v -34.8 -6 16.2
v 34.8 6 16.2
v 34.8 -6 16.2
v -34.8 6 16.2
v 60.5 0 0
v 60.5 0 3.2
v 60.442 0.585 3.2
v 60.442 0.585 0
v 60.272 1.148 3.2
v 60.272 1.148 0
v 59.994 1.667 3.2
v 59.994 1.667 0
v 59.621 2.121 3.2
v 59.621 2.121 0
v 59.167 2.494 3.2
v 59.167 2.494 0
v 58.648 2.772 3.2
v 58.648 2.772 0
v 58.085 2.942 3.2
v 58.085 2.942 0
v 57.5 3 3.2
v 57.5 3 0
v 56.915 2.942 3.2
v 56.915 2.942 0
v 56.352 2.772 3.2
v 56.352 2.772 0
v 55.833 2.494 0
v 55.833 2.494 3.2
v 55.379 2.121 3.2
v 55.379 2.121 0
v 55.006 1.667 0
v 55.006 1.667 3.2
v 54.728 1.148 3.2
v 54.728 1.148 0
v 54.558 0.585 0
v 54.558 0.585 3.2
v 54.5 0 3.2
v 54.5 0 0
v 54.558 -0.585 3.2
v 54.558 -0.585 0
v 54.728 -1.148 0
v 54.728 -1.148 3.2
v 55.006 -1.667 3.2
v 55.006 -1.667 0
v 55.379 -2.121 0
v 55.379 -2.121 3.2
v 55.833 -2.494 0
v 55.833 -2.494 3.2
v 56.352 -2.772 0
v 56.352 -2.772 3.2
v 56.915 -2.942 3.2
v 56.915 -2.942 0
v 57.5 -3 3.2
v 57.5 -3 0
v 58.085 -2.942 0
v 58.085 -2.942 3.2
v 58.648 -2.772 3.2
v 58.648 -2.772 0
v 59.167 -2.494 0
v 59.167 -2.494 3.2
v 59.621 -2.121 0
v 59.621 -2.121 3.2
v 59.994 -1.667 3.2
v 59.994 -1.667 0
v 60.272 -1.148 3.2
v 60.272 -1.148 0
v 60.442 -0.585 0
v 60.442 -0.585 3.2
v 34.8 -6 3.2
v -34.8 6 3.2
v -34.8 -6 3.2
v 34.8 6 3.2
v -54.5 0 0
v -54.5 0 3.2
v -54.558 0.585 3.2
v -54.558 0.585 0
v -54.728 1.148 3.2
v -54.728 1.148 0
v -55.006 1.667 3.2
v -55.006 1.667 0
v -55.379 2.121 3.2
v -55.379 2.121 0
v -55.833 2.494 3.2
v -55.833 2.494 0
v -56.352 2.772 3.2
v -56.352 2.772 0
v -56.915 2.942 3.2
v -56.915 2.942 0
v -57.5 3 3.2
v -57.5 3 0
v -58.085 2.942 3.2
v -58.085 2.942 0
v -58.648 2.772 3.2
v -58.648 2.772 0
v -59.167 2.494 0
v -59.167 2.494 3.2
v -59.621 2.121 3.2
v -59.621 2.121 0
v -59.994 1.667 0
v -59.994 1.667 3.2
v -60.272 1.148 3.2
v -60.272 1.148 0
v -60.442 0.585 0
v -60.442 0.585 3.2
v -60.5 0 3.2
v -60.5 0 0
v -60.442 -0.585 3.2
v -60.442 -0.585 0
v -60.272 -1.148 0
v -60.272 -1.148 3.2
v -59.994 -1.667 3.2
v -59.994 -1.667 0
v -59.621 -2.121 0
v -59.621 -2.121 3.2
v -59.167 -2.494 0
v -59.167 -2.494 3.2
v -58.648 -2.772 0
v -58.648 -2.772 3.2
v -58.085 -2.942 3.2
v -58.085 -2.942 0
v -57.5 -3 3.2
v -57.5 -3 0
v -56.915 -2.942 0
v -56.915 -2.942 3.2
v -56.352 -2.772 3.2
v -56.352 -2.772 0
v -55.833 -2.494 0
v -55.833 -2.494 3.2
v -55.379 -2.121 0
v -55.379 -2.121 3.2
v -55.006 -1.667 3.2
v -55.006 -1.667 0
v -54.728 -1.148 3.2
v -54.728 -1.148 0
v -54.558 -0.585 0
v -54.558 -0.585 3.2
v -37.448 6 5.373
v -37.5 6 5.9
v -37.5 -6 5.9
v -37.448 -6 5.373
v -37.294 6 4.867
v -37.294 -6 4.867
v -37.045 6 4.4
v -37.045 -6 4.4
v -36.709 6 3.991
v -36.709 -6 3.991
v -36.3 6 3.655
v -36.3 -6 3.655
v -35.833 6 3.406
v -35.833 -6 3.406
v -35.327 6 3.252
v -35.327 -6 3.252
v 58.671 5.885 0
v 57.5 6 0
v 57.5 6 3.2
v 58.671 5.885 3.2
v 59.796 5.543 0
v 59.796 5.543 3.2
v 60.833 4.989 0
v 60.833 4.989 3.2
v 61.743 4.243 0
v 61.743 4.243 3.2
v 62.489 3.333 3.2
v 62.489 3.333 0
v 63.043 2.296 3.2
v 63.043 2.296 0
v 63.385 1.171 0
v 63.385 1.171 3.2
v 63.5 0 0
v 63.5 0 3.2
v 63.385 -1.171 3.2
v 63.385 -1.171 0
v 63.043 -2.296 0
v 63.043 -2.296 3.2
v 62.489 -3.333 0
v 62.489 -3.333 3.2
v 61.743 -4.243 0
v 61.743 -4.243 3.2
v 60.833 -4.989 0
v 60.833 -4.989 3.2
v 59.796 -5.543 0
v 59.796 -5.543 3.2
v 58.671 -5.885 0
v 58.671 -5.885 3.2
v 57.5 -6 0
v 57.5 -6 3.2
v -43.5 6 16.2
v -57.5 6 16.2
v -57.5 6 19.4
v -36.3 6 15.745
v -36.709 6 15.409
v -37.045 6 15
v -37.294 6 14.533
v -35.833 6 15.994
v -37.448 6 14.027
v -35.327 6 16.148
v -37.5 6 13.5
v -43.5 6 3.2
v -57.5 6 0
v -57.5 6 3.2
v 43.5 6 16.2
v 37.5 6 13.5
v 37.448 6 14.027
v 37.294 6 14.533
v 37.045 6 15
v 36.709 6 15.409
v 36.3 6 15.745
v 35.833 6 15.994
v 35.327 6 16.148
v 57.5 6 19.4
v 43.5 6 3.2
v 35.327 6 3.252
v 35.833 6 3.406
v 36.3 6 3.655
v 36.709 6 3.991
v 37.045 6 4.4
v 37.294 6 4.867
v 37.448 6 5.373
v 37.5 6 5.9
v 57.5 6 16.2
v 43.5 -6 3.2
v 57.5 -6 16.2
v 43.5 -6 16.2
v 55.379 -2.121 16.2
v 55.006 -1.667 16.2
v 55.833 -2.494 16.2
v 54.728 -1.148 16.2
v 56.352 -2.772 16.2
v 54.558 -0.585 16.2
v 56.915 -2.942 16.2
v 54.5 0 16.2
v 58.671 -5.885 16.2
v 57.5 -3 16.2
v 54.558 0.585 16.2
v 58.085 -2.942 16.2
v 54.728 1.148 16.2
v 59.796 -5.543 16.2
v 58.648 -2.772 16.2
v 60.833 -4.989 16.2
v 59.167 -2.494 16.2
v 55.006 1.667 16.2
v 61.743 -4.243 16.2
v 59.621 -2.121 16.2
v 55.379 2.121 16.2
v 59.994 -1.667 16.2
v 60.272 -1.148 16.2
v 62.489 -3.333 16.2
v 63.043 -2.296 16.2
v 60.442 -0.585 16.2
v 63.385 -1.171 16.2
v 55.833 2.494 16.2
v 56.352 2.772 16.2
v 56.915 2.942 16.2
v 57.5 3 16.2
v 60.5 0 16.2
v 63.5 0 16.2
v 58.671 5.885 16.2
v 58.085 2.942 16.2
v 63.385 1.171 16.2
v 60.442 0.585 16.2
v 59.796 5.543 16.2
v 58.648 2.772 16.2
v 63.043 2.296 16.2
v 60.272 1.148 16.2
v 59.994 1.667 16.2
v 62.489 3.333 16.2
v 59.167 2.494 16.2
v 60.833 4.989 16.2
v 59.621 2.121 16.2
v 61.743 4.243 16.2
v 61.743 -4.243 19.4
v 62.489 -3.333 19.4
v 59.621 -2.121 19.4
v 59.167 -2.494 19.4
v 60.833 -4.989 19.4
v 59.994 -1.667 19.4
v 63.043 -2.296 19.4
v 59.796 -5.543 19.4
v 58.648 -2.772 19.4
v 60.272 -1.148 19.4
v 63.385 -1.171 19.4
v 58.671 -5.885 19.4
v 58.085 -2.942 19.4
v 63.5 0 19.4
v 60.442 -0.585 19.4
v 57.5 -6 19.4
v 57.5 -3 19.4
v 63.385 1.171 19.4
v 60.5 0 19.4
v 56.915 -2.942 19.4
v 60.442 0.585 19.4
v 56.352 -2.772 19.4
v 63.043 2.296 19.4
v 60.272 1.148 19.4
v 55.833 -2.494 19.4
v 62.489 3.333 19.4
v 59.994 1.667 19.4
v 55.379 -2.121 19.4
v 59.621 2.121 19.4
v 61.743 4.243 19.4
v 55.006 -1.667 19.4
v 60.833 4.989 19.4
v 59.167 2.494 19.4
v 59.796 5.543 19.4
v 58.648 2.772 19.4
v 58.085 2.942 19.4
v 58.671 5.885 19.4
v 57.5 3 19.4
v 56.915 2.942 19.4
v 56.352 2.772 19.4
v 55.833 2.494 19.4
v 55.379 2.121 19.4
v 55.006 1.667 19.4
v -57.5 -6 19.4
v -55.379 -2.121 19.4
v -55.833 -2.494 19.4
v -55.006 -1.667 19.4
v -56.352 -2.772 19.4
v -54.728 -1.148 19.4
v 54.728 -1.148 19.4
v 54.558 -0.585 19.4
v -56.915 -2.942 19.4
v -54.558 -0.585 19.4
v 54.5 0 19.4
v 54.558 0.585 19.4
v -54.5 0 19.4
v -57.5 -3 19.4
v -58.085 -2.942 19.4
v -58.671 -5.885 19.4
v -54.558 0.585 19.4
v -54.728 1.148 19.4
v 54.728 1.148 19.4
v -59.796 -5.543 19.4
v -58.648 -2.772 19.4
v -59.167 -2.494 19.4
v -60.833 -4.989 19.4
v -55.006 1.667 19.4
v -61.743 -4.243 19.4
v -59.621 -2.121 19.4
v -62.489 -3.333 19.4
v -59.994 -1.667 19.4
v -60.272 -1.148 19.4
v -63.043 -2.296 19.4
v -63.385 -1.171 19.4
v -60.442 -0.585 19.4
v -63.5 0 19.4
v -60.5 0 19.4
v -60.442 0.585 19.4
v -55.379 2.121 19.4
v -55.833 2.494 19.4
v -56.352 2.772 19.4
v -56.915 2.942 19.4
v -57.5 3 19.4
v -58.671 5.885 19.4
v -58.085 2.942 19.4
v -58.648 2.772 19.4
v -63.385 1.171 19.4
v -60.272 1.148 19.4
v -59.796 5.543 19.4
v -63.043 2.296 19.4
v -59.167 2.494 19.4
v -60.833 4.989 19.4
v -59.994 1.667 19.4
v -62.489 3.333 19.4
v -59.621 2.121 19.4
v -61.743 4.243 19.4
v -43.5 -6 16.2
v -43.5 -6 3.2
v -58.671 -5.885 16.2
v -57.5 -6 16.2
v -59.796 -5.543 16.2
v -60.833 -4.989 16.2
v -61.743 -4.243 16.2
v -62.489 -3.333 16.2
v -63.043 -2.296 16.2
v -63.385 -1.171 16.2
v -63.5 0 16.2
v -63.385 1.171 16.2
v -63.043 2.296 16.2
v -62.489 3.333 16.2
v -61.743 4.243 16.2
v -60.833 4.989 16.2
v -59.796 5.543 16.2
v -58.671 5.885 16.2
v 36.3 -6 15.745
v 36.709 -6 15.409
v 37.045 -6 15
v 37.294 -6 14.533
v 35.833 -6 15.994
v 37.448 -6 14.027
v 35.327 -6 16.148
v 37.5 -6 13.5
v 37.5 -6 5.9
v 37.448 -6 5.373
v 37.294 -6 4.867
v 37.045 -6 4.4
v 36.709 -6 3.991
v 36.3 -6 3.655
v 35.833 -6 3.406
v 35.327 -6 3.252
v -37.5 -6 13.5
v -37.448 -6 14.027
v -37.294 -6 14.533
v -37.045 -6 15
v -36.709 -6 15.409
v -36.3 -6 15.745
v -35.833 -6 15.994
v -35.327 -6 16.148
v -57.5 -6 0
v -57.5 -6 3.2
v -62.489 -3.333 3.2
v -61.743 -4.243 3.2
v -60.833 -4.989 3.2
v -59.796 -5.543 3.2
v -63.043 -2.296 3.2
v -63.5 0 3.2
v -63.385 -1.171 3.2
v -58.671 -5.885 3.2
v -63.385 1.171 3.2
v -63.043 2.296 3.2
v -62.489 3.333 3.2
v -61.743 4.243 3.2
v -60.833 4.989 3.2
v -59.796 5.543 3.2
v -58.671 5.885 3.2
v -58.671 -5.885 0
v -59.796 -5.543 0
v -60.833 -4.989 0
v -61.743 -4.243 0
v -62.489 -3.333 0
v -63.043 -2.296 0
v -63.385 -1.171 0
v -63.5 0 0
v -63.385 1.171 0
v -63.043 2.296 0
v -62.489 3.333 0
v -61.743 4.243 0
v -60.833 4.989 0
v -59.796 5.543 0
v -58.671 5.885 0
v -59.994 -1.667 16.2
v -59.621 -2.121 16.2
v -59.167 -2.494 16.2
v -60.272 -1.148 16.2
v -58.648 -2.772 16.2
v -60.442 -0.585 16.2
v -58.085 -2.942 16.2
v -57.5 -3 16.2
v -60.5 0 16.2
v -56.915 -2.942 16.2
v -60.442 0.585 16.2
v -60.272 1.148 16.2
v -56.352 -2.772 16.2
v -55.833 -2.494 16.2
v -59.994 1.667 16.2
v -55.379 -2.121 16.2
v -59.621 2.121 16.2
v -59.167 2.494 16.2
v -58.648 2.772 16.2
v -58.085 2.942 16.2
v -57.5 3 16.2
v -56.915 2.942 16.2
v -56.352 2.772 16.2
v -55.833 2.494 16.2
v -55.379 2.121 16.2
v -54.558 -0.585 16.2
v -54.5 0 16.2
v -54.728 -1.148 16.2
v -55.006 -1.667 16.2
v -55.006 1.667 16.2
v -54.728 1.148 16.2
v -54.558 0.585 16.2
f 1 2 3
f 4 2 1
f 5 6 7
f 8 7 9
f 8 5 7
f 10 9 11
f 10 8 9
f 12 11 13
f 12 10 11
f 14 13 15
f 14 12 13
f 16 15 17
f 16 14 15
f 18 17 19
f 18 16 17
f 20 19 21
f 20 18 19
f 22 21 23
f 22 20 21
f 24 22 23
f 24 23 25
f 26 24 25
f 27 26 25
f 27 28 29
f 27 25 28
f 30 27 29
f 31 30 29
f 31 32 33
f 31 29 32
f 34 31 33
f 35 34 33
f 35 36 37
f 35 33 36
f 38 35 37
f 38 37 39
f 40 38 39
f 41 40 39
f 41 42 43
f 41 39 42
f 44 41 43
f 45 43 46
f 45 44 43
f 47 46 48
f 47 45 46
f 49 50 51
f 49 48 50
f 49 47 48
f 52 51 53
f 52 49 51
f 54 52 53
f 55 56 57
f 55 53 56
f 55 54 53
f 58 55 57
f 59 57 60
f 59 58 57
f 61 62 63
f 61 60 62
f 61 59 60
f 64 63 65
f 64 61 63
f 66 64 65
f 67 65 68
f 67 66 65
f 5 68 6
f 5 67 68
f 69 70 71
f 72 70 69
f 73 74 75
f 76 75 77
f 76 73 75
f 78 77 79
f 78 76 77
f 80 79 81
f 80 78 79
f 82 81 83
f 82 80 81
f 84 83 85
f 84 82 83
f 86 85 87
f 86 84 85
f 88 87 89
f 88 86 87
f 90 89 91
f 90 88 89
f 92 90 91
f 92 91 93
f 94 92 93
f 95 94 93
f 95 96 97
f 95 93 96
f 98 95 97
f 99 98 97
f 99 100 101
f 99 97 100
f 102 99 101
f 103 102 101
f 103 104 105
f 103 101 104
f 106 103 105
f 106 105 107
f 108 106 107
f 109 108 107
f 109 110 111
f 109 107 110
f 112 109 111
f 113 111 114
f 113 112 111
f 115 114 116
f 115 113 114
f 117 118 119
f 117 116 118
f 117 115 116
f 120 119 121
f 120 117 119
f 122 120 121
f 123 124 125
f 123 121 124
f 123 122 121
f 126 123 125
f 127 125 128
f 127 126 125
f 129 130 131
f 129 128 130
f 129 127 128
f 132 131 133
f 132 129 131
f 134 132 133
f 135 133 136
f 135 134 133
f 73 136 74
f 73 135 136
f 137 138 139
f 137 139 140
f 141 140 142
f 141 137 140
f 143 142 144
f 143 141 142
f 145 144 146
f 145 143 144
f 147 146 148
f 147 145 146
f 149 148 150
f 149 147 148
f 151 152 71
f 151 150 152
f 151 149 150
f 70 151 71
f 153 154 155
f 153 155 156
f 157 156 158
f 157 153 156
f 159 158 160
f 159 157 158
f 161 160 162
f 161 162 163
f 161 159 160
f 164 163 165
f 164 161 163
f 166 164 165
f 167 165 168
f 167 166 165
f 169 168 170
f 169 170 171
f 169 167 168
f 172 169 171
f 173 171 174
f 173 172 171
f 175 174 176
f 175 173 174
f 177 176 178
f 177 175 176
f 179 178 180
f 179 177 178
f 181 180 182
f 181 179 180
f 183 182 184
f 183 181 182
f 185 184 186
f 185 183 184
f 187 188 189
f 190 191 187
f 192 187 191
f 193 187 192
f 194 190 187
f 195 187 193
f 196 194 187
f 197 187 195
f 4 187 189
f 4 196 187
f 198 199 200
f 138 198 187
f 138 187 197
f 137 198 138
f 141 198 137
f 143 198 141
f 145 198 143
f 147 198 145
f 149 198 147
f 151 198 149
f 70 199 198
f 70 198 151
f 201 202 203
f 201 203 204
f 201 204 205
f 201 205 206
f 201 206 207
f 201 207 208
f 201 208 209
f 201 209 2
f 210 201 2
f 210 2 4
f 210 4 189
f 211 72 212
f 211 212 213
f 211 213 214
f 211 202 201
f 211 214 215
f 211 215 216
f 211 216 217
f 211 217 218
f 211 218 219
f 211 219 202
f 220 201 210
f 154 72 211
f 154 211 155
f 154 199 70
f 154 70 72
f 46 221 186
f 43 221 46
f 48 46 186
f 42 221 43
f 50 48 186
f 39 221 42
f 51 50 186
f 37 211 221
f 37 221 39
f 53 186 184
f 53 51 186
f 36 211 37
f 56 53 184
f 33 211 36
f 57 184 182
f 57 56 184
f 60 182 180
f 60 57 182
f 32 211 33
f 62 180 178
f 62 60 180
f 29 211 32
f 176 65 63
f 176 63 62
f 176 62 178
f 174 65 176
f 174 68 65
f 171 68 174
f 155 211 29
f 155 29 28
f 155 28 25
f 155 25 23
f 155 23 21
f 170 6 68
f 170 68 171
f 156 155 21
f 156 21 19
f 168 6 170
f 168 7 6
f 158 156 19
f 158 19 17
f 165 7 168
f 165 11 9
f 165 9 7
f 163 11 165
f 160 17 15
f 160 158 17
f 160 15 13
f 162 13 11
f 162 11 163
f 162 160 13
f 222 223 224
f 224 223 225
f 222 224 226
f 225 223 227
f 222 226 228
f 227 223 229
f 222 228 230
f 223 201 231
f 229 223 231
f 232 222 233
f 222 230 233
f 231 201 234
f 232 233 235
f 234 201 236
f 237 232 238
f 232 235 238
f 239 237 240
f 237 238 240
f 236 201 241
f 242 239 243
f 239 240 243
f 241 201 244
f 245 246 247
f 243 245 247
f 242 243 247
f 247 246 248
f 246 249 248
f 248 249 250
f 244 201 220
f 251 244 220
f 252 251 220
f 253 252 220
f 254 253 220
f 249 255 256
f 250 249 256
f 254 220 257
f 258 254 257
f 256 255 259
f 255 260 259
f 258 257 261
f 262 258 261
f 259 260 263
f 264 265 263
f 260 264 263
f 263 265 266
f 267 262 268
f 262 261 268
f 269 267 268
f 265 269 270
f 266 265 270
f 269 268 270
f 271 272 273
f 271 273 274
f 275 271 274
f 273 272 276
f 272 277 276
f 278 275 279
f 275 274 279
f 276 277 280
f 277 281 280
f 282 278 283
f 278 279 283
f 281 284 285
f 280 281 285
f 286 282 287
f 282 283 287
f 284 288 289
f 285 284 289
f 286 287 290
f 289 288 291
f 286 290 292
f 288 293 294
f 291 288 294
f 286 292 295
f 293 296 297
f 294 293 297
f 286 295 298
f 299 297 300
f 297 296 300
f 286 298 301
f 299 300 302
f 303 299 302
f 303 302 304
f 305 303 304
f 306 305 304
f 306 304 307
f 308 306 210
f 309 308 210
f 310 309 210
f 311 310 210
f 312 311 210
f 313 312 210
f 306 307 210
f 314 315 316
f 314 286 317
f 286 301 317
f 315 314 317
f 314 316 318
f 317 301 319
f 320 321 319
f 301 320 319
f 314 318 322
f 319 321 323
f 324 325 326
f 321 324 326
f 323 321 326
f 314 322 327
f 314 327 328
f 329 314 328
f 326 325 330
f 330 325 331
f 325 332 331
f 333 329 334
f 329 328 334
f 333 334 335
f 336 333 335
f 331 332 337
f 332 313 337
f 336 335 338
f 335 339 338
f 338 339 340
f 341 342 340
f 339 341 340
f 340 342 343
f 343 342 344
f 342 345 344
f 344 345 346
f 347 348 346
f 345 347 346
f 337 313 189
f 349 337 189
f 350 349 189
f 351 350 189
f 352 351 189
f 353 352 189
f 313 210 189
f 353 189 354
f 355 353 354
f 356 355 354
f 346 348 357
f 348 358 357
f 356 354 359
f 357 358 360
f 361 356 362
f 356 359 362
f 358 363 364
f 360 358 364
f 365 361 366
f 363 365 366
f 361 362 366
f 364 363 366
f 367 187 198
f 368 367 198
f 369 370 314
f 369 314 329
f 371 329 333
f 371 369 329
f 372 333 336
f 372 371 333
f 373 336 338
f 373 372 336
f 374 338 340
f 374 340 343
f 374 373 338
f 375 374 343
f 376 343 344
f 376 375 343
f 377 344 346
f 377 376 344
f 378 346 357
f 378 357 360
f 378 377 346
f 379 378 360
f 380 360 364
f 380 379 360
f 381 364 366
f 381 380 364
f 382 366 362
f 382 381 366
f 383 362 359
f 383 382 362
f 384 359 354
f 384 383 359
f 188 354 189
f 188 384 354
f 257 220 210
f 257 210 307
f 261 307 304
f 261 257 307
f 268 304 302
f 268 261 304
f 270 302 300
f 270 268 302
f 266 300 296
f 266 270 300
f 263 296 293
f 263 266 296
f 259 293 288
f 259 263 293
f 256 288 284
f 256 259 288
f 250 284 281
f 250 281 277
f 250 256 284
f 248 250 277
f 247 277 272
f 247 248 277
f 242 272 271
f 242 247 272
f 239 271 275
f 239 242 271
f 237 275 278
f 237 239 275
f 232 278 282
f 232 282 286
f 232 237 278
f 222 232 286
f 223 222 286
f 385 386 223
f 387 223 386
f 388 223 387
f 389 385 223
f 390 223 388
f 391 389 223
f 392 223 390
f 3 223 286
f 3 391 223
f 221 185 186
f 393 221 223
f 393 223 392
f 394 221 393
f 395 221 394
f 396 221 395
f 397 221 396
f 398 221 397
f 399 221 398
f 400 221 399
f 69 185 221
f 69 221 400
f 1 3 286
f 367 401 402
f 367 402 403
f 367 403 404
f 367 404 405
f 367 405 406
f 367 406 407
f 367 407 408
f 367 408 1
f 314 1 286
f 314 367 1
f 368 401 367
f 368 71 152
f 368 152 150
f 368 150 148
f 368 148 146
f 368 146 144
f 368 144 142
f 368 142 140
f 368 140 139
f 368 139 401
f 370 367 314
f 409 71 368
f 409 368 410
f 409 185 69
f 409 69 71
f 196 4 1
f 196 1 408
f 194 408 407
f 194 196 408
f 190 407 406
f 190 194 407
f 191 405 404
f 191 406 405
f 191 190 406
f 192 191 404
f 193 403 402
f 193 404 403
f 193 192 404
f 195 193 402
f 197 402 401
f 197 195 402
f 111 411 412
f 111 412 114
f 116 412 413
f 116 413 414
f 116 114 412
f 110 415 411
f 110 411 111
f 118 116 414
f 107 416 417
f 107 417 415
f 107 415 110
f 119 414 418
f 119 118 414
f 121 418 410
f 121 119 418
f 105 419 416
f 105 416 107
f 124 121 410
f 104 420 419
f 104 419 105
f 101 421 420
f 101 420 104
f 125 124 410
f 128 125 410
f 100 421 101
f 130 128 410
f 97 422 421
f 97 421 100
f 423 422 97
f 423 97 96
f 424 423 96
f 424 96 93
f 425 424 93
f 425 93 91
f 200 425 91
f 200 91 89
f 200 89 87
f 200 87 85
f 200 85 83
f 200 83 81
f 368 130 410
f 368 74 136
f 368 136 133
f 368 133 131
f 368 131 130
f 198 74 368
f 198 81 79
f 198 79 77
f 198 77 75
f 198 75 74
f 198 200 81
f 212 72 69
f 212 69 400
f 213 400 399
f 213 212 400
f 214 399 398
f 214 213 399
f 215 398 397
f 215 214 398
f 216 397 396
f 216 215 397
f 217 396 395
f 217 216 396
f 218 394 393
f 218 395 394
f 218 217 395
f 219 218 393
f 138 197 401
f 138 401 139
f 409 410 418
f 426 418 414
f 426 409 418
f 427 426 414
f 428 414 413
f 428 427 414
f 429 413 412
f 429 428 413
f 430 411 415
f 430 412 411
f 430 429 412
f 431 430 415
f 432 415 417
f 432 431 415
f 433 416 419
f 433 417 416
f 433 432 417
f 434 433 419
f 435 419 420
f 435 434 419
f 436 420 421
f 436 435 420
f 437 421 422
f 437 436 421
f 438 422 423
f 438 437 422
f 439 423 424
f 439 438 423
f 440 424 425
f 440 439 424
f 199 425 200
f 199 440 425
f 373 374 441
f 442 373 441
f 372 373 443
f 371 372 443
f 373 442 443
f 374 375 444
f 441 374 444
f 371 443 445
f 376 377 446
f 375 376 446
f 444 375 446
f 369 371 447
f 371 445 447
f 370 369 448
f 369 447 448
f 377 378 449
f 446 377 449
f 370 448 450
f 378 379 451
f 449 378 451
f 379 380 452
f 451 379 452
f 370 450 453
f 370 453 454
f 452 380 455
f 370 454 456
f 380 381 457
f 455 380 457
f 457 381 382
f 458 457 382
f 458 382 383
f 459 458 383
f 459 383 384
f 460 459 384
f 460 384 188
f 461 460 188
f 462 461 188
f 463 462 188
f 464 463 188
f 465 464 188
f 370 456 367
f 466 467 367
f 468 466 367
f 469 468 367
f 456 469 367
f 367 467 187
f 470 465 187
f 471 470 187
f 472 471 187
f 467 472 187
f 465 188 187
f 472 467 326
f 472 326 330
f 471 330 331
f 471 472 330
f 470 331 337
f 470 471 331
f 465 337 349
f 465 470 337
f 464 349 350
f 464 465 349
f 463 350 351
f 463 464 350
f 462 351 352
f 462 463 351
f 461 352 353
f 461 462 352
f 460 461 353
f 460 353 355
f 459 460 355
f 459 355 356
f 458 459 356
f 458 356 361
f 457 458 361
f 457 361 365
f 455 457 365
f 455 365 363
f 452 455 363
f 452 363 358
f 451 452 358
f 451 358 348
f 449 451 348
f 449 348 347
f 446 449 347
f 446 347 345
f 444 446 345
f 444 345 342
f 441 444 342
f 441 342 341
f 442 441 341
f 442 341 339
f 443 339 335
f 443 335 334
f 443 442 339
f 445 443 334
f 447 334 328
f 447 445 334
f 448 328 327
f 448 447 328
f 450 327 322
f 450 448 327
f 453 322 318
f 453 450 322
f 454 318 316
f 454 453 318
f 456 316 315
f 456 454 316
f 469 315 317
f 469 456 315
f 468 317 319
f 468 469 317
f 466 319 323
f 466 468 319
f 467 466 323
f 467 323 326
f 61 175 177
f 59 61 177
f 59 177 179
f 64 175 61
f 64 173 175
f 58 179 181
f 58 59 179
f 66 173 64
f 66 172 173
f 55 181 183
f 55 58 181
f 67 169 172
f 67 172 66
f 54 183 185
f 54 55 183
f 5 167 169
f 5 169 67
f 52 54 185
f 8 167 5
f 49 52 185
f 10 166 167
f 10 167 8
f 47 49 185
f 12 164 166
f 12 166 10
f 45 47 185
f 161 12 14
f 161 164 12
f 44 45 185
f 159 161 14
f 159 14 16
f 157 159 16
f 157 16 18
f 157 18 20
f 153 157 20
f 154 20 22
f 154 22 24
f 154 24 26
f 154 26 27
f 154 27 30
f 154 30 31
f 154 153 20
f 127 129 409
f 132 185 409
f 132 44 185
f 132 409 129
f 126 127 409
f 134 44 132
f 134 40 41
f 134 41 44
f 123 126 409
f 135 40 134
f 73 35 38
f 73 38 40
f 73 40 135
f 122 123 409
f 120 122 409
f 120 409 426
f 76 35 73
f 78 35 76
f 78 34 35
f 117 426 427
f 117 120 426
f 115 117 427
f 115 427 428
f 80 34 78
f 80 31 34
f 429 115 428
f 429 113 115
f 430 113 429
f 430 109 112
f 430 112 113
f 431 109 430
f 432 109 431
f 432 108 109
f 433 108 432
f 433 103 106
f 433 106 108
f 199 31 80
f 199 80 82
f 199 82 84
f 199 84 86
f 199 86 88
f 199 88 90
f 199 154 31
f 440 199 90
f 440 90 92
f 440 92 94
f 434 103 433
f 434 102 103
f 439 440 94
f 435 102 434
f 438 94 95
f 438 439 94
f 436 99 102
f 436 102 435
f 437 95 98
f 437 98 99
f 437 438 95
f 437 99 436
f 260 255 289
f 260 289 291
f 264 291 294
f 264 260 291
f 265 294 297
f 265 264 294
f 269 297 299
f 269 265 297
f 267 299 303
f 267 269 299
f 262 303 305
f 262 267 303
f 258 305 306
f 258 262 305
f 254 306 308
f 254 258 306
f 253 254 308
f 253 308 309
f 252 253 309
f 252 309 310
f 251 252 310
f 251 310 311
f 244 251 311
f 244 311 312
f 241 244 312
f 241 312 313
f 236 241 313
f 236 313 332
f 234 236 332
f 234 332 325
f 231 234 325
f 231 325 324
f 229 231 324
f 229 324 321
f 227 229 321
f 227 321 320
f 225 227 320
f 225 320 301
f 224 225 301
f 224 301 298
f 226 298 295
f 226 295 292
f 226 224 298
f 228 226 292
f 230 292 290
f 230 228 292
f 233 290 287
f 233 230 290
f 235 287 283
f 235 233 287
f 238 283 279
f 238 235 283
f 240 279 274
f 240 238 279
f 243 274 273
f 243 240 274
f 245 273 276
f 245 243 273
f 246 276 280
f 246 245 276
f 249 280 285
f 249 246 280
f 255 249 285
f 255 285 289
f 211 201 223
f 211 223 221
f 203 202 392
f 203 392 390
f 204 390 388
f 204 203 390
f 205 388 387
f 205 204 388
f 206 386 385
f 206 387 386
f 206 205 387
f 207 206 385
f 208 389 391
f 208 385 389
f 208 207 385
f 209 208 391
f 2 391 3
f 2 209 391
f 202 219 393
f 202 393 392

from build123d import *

# Parameters (mm, degrees)
SKETCH_1_R          = 3
EXTRUDE_1_DEPTH     = 19.4
SKETCH_2_W          = 20
SKETCH_2_H          = 13
CUT_EXTRUDE_1_DEPTH = 68.47303165


with BuildPart() as part:
    # 草图1 → 凸台-拉伸1 (new body)
    with BuildSketch(Plane.XY):
        with BuildLine():
            Line((-57.5, 6), (57.5, 6))
            ThreePointArc((57.5, 6), (63.5, 0), (57.5, -6))
            Line((57.5, -6), (-57.5, -6))
            ThreePointArc((-57.5, -6), (-63.5, 0), (-57.5, 6))
        make_face()
        with Locations((-57.5, 0)):
            Circle(SKETCH_1_R, mode=Mode.SUBTRACT)
        with Locations((57.5, 0)):
            Circle(SKETCH_1_R, mode=Mode.SUBTRACT)
    extrude(amount=EXTRUDE_1_DEPTH)

    # 草图2 → 切除-拉伸1 (cut, through all)
    with BuildSketch(Plane(origin=(0, 6, 0), x_dir=(1, 0, 0), z_dir=(0, 1, 0))):
        with Locations((-53.5, -9.7)):
            Rectangle(SKETCH_2_W, SKETCH_2_H)
        with Locations((53.5, -9.7)):
            Rectangle(SKETCH_2_W, SKETCH_2_H)
        with BuildLine():
            Line((-34.8, -3.2), (34.8, -3.2))
            ThreePointArc((34.8, -3.2), (36.709188309, -3.990811691), (37.5, -5.9))
            Line((37.5, -5.9), (37.5, -13.5))
            ThreePointArc((37.5, -13.5), (36.709188309, -15.409188309), (34.8, -16.2))
            Line((34.8, -16.2), (-34.8, -16.2))
            ThreePointArc((-34.8, -16.2), (-36.709188309, -15.409188309), (-37.5, -13.5))
            Line((-37.5, -13.5), (-37.5, -5.9))
            ThreePointArc((-37.5, -5.9), (-36.709188309, -3.990811691), (-34.8, -3.2))
        make_face()
    extrude(amount=-CUT_EXTRUDE_1_DEPTH, mode=Mode.SUBTRACT)


solid = part.part
